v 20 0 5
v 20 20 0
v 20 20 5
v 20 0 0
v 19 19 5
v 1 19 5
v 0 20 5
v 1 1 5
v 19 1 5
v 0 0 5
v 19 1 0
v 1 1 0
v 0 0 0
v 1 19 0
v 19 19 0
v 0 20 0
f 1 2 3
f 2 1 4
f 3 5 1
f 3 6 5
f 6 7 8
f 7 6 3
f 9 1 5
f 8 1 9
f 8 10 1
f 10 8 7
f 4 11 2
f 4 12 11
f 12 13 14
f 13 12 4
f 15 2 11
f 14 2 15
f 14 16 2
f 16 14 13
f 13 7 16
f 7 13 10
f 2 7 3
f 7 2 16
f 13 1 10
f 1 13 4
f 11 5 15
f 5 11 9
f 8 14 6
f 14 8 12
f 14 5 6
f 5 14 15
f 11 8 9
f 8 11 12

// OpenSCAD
$fn=50;

/*
union() {

difference() {
cylinder(r=10,h=5);
cylinder(r=9,h=5);
}

difference() {
cylinder(r=12,h=1.5);
cylinder(r=7,h=1.5);
}

}
*/

difference() {
cube([20,20,5]);
translate([1,1,0])cube([18,18,5]);
}
